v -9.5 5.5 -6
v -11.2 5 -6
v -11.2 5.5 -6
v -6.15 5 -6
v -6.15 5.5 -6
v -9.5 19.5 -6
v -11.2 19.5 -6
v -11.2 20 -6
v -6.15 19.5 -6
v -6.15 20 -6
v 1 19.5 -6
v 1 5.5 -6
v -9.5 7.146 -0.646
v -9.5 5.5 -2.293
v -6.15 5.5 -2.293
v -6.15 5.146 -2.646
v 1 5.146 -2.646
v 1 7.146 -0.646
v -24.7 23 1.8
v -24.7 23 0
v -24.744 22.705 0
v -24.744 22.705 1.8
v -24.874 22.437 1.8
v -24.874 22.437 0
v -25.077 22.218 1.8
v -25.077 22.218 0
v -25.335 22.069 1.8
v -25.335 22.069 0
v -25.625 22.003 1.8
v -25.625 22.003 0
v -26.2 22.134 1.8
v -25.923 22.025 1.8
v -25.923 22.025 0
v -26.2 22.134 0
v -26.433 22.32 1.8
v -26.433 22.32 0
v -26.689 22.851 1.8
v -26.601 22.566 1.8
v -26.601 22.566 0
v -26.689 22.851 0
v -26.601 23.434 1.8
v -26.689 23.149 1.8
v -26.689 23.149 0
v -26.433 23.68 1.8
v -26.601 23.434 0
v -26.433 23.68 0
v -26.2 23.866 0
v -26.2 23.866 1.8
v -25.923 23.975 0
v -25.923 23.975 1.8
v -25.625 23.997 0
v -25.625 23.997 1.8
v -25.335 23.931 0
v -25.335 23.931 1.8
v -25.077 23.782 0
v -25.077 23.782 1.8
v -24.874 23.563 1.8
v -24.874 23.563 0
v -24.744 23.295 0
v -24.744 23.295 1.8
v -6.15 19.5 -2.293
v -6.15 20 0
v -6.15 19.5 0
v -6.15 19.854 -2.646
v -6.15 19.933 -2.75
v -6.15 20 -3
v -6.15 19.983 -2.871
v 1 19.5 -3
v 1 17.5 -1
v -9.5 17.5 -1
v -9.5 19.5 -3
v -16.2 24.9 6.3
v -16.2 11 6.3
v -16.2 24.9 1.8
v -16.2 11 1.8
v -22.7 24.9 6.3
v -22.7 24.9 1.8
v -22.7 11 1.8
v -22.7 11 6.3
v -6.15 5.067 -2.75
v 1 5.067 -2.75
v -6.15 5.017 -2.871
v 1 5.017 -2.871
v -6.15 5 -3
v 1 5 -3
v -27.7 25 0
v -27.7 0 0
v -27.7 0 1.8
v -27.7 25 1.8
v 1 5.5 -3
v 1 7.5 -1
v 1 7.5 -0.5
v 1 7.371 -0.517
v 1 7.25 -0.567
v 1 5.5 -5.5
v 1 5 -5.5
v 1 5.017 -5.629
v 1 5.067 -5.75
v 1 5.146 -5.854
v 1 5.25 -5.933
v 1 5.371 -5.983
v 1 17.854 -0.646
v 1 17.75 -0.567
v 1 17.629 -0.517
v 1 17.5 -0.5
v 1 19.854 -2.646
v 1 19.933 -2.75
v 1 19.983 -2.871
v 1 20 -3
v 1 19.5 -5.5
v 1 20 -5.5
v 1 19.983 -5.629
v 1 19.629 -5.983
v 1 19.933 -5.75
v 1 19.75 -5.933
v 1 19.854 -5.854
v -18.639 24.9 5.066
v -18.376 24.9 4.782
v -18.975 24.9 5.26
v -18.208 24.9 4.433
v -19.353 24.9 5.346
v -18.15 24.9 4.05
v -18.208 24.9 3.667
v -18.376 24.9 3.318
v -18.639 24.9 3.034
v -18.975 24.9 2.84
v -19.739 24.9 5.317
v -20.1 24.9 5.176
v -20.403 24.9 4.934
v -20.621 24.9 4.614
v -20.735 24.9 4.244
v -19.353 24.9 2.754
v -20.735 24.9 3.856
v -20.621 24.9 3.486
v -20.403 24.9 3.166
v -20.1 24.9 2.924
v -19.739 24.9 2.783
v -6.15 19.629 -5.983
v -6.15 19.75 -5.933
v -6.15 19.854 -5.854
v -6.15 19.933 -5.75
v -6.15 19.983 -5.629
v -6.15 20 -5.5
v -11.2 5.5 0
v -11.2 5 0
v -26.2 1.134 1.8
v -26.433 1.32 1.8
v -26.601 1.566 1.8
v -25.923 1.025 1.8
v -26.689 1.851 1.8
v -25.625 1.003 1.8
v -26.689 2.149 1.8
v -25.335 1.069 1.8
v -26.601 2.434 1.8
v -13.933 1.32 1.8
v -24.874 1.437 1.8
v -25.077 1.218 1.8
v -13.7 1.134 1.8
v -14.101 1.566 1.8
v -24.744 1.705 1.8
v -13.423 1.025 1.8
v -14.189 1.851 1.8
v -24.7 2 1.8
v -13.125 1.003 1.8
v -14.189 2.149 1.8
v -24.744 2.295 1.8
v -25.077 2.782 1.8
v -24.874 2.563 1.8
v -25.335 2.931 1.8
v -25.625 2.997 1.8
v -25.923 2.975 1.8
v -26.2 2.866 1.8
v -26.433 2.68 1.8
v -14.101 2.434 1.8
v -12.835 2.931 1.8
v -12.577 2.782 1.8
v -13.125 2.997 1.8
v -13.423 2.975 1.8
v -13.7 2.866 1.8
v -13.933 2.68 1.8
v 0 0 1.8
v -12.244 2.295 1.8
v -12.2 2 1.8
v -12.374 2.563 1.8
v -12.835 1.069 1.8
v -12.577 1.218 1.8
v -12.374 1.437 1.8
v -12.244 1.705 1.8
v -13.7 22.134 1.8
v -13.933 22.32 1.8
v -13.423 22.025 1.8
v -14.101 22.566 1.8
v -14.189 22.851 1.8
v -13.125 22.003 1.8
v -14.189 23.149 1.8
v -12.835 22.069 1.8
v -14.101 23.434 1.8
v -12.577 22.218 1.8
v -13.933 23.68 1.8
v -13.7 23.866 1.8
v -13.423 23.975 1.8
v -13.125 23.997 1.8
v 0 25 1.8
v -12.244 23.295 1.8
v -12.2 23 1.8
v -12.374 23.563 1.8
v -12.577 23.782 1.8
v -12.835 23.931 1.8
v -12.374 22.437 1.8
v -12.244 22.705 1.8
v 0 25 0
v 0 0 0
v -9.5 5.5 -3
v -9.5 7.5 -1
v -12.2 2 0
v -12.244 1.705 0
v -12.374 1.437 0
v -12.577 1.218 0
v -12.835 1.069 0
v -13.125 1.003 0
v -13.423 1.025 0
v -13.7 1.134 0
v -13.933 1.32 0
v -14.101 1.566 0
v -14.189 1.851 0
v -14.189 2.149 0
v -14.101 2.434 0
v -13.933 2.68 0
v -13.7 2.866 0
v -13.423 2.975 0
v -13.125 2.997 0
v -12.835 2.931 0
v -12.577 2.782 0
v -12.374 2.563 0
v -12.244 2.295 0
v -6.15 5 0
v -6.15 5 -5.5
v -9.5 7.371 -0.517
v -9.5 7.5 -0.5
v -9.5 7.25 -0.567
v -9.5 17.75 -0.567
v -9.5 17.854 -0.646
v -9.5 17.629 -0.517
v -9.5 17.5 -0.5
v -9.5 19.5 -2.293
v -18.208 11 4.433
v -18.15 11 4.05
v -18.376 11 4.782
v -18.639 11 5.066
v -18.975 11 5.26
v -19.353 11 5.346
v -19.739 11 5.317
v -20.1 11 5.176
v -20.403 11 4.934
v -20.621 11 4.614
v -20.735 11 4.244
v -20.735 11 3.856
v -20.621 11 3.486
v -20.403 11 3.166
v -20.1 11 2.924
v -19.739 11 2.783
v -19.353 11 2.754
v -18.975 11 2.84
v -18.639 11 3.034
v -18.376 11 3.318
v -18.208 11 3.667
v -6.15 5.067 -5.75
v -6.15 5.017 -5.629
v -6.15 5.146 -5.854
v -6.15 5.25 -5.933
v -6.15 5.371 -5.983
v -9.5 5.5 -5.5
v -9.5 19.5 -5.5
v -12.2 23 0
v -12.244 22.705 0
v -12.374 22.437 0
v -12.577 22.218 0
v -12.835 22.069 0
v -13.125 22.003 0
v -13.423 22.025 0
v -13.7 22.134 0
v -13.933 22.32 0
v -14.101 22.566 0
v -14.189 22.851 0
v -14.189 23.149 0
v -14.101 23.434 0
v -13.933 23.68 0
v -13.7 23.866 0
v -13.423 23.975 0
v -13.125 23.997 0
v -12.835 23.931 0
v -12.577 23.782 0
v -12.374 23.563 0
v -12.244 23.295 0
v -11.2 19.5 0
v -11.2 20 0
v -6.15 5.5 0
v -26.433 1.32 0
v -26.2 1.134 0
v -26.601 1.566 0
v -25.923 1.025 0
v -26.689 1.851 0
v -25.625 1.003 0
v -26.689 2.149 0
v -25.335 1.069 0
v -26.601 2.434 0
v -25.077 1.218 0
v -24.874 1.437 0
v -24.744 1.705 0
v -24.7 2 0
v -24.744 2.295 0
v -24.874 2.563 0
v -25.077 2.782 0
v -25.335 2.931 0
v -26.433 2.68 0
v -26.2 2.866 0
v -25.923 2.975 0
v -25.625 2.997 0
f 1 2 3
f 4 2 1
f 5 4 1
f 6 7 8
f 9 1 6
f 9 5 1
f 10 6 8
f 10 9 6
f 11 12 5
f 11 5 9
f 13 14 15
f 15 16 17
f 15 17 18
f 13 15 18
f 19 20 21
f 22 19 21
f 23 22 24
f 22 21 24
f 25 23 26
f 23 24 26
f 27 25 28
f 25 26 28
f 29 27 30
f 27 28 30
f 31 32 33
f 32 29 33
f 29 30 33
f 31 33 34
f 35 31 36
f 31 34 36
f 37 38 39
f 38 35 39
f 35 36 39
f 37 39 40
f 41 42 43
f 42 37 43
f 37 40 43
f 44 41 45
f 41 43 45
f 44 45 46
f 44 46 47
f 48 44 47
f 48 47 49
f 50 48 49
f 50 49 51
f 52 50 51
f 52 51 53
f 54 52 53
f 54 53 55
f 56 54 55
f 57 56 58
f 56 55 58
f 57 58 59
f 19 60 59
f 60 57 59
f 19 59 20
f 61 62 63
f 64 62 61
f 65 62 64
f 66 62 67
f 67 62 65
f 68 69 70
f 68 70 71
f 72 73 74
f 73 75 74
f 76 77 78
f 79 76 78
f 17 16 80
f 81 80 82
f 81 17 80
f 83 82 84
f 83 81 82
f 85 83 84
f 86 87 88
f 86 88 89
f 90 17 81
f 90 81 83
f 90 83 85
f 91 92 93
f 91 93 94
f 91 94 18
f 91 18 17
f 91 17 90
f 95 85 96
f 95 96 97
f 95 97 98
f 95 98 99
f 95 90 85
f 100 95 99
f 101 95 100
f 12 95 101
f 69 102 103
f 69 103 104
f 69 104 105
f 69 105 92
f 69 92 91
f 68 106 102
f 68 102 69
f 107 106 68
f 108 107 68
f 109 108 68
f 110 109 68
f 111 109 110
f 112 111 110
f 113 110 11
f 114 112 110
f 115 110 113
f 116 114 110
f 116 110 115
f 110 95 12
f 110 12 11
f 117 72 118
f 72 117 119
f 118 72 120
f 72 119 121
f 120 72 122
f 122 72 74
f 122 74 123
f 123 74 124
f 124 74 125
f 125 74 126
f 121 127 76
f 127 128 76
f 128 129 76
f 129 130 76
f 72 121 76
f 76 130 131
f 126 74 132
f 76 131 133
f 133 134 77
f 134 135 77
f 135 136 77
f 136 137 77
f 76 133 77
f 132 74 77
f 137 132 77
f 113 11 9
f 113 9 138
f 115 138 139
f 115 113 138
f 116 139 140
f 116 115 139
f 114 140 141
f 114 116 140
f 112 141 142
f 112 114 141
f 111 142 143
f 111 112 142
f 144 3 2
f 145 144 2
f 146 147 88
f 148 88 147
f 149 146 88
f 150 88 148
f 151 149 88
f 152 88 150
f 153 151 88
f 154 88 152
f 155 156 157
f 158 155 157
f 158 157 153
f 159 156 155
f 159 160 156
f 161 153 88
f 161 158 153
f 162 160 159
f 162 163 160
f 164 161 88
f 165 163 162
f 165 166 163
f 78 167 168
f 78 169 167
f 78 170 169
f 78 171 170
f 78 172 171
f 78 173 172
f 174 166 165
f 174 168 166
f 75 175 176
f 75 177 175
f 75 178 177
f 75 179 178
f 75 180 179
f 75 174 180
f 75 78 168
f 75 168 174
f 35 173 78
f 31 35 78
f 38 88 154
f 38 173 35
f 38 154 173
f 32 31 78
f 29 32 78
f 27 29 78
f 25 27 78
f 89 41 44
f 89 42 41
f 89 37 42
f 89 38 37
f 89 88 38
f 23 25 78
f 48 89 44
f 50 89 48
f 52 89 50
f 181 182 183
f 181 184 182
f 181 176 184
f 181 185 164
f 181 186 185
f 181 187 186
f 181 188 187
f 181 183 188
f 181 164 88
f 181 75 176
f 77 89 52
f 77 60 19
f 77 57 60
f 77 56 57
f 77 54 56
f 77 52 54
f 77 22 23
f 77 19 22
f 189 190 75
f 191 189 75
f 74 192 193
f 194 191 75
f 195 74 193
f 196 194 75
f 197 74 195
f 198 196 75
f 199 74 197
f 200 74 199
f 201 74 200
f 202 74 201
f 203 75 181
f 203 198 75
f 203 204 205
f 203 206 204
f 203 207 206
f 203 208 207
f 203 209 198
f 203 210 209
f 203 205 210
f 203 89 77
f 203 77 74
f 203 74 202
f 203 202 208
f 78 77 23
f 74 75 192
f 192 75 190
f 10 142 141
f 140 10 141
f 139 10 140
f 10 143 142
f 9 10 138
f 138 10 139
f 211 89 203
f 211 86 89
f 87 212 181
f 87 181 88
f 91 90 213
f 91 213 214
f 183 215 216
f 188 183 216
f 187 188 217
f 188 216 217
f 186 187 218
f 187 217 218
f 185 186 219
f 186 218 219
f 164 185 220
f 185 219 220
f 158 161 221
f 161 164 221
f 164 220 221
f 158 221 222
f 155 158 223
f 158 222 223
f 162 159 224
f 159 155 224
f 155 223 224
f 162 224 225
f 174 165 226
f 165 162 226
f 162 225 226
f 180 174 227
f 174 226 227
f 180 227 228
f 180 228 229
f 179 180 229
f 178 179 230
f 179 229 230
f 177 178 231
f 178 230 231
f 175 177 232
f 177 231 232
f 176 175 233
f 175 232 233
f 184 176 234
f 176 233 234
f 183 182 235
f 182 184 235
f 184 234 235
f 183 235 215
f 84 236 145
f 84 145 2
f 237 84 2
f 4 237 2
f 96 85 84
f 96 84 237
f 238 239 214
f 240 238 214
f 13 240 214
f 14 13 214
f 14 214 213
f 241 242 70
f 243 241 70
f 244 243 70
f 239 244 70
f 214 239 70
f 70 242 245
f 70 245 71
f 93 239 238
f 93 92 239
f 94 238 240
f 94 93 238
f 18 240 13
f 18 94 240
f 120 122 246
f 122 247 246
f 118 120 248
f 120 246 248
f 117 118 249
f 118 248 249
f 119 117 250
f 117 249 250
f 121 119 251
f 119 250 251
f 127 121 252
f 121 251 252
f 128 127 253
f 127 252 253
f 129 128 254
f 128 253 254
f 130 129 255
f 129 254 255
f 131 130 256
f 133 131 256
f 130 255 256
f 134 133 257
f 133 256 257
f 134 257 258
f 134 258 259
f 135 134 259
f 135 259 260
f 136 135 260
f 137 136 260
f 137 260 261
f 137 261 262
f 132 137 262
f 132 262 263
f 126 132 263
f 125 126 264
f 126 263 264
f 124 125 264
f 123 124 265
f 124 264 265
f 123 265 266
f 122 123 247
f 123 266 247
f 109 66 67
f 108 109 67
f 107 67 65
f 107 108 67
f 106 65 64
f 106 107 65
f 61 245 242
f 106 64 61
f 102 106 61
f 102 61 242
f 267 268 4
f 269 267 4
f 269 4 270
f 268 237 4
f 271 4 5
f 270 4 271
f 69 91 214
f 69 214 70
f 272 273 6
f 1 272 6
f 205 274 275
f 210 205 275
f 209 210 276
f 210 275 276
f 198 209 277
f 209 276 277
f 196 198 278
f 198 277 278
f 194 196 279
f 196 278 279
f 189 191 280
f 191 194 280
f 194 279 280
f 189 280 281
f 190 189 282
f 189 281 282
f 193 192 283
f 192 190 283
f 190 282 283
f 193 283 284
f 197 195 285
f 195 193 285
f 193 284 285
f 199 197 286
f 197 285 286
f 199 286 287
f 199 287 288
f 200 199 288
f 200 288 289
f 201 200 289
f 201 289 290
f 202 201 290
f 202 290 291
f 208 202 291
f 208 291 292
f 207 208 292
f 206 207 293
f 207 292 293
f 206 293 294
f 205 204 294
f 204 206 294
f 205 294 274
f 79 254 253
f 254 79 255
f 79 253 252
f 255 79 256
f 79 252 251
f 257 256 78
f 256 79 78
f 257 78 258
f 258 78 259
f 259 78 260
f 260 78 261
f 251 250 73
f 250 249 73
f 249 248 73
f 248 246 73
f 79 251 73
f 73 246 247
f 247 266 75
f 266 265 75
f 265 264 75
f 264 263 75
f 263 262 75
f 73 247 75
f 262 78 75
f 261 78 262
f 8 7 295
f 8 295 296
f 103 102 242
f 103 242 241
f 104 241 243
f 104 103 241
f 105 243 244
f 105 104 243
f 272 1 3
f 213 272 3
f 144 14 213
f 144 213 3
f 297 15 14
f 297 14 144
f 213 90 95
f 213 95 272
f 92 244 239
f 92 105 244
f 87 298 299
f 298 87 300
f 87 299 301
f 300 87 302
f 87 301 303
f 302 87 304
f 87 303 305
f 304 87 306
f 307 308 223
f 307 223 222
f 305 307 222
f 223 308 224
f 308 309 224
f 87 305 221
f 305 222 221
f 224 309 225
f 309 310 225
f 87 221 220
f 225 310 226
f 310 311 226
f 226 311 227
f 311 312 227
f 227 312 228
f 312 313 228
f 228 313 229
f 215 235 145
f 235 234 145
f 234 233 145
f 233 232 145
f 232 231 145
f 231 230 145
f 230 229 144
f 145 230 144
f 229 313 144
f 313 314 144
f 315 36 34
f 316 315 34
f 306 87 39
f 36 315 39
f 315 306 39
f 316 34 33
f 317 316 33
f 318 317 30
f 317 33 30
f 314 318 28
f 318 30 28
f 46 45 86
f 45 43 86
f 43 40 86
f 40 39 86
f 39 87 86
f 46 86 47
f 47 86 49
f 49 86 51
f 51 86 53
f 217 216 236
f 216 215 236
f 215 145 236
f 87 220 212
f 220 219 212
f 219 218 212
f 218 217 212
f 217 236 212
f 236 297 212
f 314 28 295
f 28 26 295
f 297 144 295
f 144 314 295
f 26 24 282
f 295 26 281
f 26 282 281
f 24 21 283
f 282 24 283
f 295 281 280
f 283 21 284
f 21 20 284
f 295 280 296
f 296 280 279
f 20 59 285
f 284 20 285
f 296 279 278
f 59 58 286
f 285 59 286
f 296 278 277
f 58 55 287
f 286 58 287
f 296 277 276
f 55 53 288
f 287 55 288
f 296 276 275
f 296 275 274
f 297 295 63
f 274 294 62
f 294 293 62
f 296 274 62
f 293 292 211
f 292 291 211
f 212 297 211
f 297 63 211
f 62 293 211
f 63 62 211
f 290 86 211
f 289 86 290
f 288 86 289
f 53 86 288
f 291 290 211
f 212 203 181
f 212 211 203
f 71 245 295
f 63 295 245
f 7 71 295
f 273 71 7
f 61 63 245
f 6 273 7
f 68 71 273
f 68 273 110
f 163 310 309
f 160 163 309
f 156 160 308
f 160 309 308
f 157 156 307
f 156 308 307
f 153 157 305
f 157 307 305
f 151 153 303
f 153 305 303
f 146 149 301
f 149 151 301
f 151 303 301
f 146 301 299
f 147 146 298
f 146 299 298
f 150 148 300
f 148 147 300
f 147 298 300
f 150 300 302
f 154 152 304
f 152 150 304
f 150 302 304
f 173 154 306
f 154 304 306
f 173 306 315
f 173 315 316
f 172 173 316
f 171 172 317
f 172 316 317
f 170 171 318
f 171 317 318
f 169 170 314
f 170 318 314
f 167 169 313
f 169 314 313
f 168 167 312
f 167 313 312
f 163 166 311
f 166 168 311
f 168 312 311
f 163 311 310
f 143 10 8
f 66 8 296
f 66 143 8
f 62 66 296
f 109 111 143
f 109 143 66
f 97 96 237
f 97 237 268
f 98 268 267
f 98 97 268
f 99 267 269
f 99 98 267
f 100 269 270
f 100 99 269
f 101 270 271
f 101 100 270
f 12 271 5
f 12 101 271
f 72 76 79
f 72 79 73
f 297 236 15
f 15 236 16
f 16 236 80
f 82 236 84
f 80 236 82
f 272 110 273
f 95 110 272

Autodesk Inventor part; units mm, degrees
ref_plane "YZ Plane" through (0, 0, 0) normal (1, 0, 0) x (0, 1, 0)
ref_plane "XZ Plane" through (0, 0, 0) normal (0, 1, 0) x (-1, 0, 0)
ref_plane "XY Plane" through (0, 0, 0) normal (0, 0, 1) x (1, 0, 0)
sketch "Sketch1" plane through (0, 0, 0) normal (0, 0, 1) x (1, 0, 0)
  line L0 (0, 0) -> (-27.7, 0)
  line L1 (-27.7, 0) -> (-27.7, 25)
  line L2 (-27.7, 25) -> (0, 25)
  line L3 (0, 25) -> (0, 0)
  circle A0 centre (-25.7, 23) radius 1
  circle A1 centre (-13.2, 23) radius 1
  circle A2 centre (-13.2, 2) radius 1
  circle A3 centre (-25.7, 2) radius 1
  line L4 (-25.7, 2) -> (-25.7, 23) construction
  line L5 (-25.7, 23) -> (-13.2, 23) construction
  line L6 (-13.2, 23) -> (-13.2, 2) construction
  line L7 (-13.2, 2) -> (-25.7, 2) construction
  line L8 (-13.2, 12.5) -> (0, 12.5) construction
  dimension "d0" = 25
  dimension "d1" = 27.7
  dimension "d2" = 12.5
  dimension "d3" = 21
  dimension "d4" = 2
  dimension "d5" = 2
extrude "Extrusion1" add sketch "Sketch1" along normal blind 1.8
sketch "Sketch2" plane through (0, 0, 1.8) normal (0, 0, 1) x (1, 0, 0)
  line L0 (0, 0) -> (0, 25) construction
  line L1 (0, 25) -> (-27.7, 25) construction
  line L2 (-27.7, 25) -> (-27.7, 0) construction
  line L3 (-27.7, 0) -> (0, 0) construction
  circle A0 centre (-25.7, 2) radius 1 construction
  circle A1 centre (-13.2, 2) radius 1 construction
  circle A2 centre (-13.2, 23) radius 1 construction
  circle A3 centre (-25.7, 23) radius 1 construction
  line L4 (-22.7, 11) -> (-16.2, 11)
  line L5 (-16.2, 11) -> (-16.2, 24.9)
  line L6 (-16.2, 24.9) -> (-22.7, 24.9)
  line L7 (-22.7, 24.9) -> (-22.7, 11)
  dimension "d8" = 6.5
  dimension "d10" = 5
  dimension "d33" = 14
  dimension "d34" = 0.1
extrude "Extrusion2" add sketch "Sketch2" along normal blind 4.5
ref_plane "Work Plane1" through (0, 25, 0) normal (0.7071, -0.7071, 0) x (0, 0, -1)
ref_plane "Work Plane2" through (-27.7, 26, 0) normal (0, 1, 0) x (1, 0, 0)
ref_plane "Work Plane3" through (1, 0, 0) normal (1, 0, 0) x (0, 0, -1)
sketch "Sketch4" plane through (1, 0, 0) normal (1, 0, 0) x (0, 0, -1)
  line L0 (5.5, 20) -> (3, 20)
  line L1 (0.5, 17.5) -> (0.5, 7.5)
  line L2 (3, 5) -> (5.5, 5)
  line L3 (6, 5.5) -> (6, 19.5)
  line L4 (0, 0) -> (0, 25) construction
  line L5 (2.6464, 19.8536) -> (0.6464, 17.8536)
  line L6 (2.6464, 5.1464) -> (0.6464, 7.1464)
  line L7 (6, 12.5) -> (0, 12.5) construction
  arc A0 (6, 19.5) -> (5.5, 20) centre (5.5, 19.5) ccw
  arc A1 (5.5, 5) -> (6, 5.5) centre (5.5, 5.5) ccw
  arc A2 (2.6464, 5.1464) -> (3, 5) centre (3, 5.5) ccw
  arc A3 (0.5, 7.5) -> (0.6464, 7.1464) centre (1, 7.5) ccw
  arc A4 (0.6464, 17.8536) -> (0.5, 17.5) centre (1, 17.5) ccw
  arc A5 (3, 20) -> (2.6464, 19.8536) centre (3, 19.5) ccw
  line L8 (5.5, 19.5) -> (5.5, 5.5)
  line L9 (5.5, 5.5) -> (3, 5.5)
  line L10 (3, 5.5) -> (1, 7.5)
  line L11 (1, 7.5) -> (1, 17.5)
  line L12 (1, 17.5) -> (3, 19.5)
  line L13 (3, 19.5) -> (5.5, 19.5)
  point P0 (6, 20)
  point P1 (6, 5)
  point P2 (0.5, 12.5)
  dimension "d17" = 0.5
  dimension "d19" = 15
  dimension "d20" = 5.5
  dimension "d21" = 0.5
  dimension "d22" = 135
  dimension "d23" = 3
  dimension "d24" = 0.5
extrude "Extrusion3" add sketch "Sketch4" against normal blind 10.5
sketch "Sketch5" plane through (1, 5.5, -6) normal (0, 0, -1) x (-1, 0, 0)
  line L0 (1, -5.5) -> (1, 19.5) construction
  line L1 (28.7, -5.5) -> (1, -5.5) construction
  line L2 (28.7, 19.5) -> (28.7, -5.5) construction
  line L3 (1, 19.5) -> (28.7, 19.5) construction
  circle A0 centre (26.7, -3.5) radius 1 construction
  circle A1 centre (14.2, -3.5) radius 1 construction
  circle A2 centre (14.2, 17.5) radius 1 construction
  circle A3 centre (26.7, 17.5) radius 1 construction
  line L4 (0, 0) -> (0, 14) construction
  line L5 (0, 0) -> (10.5, 0) construction
  line L6 (10.5, 14) -> (10.5, 0) construction
  line L7 (0, 14) -> (10.5, 14) construction
  line L8 (0, -0.5) -> (10.5, -0.5) construction
  line L9 (1, -5.5) -> (1, 19.5) construction
  line L10 (28.7, -5.5) -> (1, -5.5) construction
  line L11 (28.7, 19.5) -> (28.7, -5.5) construction
  line L12 (1, 19.5) -> (28.7, 19.5) construction
  circle A4 centre (26.7, -3.5) radius 1 construction
  circle A5 centre (14.2, -3.5) radius 1 construction
  circle A6 centre (14.2, 17.5) radius 1 construction
  circle A7 centre (26.7, 17.5) radius 1 construction
  line L13 (0, 14.5) -> (10.5, 14.5) construction
  line L14 (12.2, 14.5) -> (7.1495, 14.5)
  line L15 (7.1495, 14.5) -> (7.1495, 14)
  line L16 (7.1495, 14) -> (12.2, 14)
  line L17 (12.2, 14) -> (12.2, 14.5)
  line L18 (12.2, -0.5) -> (7.1495, -0.5)
  line L19 (7.1495, -0.5) -> (7.1495, 0)
  line L20 (7.1495, 0) -> (12.2, 0)
  line L21 (12.2, 0) -> (12.2, -0.5)
  dimension "d27" = 12.2
extrude "Extrusion4" add sketch "Sketch5" against normal up to surface (6 mm away)
sketch "Sketch6" plane through (-22.7, 11, 1.8) normal (0, -1, 0) x (1, 0, 0)
  line L0 (6.5, 0) -> (0, 0) construction
  line L1 (6.5, 0) -> (6.5, 4.5) construction
  line L2 (0, 4.5) -> (6.5, 4.5) construction
  line L3 (0, 0) -> (0, 4.5) construction
  line L4 (6.5, 0) -> (0, 4.5)
  circle A0 centre (3.25, 2.25) radius 1.3
  point P0 (22.7, -1.8)
  dimension "d30" = 2.6
extrude "Extrusion5" cut sketch "Sketch6" against normal through all
properties part number "F001-PCB1"
